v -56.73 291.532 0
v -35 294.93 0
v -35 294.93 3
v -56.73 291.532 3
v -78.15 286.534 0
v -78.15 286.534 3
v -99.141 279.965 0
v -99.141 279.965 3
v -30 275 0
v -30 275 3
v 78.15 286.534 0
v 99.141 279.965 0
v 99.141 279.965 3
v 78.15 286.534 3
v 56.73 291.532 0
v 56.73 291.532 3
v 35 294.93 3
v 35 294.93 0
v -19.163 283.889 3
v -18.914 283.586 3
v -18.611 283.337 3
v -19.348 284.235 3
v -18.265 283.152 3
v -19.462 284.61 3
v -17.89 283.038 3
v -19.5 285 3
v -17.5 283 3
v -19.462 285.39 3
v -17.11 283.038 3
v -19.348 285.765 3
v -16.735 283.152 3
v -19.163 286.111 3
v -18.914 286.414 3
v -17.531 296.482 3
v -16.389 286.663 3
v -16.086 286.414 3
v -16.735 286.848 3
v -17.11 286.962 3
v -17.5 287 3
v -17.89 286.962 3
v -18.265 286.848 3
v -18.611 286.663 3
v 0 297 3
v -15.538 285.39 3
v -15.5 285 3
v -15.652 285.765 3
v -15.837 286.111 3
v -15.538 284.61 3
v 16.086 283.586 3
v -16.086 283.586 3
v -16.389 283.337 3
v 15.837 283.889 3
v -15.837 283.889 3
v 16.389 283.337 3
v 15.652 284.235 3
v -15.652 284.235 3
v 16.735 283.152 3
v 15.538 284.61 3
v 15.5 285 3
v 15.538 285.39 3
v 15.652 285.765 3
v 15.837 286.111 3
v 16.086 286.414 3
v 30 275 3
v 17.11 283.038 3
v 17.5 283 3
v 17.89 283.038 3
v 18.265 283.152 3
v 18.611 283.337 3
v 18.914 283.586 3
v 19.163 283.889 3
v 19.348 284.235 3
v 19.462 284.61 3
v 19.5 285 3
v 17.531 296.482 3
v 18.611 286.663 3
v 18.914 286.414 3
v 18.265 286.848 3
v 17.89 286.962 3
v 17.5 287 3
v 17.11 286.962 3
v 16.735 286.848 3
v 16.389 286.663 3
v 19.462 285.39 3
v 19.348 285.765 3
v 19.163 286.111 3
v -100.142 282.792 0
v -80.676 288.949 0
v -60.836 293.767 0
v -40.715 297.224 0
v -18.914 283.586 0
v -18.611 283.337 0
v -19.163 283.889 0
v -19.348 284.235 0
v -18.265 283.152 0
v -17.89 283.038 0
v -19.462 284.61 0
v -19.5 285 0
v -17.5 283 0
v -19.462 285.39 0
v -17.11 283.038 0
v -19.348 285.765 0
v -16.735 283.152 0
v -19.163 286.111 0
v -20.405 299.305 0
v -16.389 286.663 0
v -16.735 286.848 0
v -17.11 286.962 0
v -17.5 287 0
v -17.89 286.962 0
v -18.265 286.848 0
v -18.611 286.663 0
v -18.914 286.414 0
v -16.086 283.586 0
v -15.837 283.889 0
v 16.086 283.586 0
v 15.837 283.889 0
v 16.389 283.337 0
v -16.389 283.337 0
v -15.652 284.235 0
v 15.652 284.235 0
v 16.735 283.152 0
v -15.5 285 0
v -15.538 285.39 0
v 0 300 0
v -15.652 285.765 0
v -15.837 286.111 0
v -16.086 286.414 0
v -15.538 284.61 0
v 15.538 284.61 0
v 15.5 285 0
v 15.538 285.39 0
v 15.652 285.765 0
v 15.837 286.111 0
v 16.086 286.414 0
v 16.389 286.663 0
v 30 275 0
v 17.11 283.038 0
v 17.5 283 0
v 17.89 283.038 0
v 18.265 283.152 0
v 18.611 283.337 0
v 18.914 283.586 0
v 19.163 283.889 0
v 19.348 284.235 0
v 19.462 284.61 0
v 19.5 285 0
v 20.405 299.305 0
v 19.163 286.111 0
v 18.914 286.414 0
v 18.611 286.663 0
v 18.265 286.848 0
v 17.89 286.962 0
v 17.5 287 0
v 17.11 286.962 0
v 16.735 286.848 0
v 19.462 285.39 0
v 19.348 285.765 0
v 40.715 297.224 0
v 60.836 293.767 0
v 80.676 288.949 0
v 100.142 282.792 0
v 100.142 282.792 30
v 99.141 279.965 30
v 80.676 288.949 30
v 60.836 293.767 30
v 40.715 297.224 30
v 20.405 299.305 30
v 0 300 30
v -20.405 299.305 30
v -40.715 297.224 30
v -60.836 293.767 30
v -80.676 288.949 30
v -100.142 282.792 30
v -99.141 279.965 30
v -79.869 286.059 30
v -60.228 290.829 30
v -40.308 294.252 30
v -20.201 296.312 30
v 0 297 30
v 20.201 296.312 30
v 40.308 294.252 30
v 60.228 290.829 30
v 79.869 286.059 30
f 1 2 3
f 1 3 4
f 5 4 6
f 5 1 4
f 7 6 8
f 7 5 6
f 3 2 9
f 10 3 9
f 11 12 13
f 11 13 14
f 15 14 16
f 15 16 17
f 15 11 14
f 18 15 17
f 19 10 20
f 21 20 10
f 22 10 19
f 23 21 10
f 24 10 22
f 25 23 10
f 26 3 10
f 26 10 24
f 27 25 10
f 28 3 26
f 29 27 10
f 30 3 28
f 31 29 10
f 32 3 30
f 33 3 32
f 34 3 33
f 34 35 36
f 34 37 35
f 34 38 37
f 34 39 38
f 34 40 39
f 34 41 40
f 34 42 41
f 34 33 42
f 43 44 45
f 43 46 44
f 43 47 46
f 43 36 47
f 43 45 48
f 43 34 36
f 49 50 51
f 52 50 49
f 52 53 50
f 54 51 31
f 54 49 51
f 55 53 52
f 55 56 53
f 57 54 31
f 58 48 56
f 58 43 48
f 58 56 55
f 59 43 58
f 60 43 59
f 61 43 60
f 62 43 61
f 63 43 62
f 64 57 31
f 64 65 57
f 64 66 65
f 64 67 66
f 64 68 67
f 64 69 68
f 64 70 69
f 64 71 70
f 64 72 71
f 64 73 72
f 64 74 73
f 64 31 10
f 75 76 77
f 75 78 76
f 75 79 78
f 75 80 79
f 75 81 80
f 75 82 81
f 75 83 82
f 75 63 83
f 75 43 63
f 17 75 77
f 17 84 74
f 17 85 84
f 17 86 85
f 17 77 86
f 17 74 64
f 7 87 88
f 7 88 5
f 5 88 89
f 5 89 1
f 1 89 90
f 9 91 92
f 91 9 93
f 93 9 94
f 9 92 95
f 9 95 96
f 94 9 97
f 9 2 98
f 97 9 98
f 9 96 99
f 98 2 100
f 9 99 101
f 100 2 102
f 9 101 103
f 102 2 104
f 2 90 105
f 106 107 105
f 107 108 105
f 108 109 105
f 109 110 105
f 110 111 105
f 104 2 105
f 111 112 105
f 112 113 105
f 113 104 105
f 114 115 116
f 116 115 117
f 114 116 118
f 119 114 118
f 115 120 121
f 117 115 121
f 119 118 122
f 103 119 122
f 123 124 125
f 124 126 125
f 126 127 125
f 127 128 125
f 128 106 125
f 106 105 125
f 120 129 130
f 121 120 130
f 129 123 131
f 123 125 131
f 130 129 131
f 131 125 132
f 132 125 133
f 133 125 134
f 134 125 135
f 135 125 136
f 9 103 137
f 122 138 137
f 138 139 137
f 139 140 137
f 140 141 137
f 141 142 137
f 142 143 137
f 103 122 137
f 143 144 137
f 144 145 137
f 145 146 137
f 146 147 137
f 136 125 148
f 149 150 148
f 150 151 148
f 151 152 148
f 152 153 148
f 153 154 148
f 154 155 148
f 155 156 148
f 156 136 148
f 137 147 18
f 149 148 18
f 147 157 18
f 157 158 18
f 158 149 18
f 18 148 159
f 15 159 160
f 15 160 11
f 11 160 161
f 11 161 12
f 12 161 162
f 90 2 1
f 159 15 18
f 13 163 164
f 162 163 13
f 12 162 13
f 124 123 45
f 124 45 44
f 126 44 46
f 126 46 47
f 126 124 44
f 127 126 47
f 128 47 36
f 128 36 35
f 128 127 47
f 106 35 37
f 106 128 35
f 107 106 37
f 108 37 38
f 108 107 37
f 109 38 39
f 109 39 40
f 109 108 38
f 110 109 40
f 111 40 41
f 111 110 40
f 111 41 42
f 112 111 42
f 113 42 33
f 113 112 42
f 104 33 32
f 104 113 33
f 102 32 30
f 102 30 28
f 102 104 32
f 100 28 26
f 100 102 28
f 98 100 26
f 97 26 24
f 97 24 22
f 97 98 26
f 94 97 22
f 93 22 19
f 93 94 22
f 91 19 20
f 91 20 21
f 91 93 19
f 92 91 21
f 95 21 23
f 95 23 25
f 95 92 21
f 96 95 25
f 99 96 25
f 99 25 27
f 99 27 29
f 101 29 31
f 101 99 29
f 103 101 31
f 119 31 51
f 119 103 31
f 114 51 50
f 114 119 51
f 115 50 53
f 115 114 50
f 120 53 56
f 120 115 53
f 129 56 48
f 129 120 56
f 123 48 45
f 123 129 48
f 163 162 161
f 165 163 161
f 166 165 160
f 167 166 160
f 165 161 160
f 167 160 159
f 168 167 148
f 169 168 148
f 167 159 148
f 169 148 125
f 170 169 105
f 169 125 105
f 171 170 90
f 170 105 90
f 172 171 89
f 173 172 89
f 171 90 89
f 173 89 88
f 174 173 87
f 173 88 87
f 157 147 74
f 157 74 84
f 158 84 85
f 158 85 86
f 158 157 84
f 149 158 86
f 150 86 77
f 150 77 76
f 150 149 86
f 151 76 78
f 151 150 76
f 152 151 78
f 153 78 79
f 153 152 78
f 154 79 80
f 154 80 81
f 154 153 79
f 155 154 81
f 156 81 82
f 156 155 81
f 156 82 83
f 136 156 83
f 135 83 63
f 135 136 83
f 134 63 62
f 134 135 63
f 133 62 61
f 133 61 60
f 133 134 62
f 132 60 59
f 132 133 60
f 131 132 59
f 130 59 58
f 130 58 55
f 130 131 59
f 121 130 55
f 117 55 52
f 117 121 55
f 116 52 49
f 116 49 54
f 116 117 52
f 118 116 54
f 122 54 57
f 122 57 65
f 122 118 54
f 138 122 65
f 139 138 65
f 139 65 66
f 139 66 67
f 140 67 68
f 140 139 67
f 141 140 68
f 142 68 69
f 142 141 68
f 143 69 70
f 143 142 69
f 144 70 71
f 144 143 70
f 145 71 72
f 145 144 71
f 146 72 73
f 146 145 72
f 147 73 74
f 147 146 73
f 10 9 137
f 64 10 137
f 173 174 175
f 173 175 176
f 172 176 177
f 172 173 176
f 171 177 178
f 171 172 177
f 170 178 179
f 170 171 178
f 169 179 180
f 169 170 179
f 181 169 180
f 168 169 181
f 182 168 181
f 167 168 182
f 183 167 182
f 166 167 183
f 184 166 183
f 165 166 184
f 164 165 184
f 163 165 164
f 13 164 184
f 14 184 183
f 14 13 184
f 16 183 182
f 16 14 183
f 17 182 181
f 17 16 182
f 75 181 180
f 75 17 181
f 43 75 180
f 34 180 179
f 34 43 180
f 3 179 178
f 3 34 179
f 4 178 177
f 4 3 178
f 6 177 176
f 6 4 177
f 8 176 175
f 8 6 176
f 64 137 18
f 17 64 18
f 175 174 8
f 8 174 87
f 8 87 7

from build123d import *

# Parameters (mm, degrees)
SKETCH_R     = 2
PAD_DEPTH    = 3
PAD001_DEPTH = 27


with BuildPart() as part:
    # Sketch → Pad (new body)
    with BuildSketch(Plane.XY):
        with BuildLine():
            ThreePointArc((100.142058, 282.792447), (0, 300), (-100.142058, 282.792447))
            Line((-100.142058, 282.792447), (-99.140637, 279.964523))
            ThreePointArc((-35, 294.9305), (-67.486464, 289.23101), (-99.140637, 279.964523))
            Line((-35, 294.9305), (-30, 275))
            Line((-30, 275), (30, 275))
            Line((30, 275), (35, 294.9305))
            ThreePointArc((99.140637, 279.964523), (67.486464, 289.23101), (35, 294.9305))
            Line((100.142058, 282.792447), (99.140637, 279.964523))
        make_face()
        with Locations((-17.5, 285)):
            Circle(SKETCH_R, mode=Mode.SUBTRACT)
        with Locations((17.5, 285)):
            Circle(SKETCH_R, mode=Mode.SUBTRACT)
    extrude(amount=PAD_DEPTH)

    # Sketch001 (on Face12 of Pad) → Pad001 (join)
    with BuildSketch(Plane.XY.offset(3)):
        with BuildLine():
            ThreePointArc((100.142058, 282.792447), (0, 300), (-100.142058, 282.792447))
            Line((-100.142058, 282.792447), (-99.140637, 279.964523))
            ThreePointArc((99.140637, 279.964523), (0, 297), (-99.140637, 279.964523))
            Line((100.142058, 282.792447), (99.140637, 279.964523))
        make_face()
    extrude(amount=PAD001_DEPTH)


solid = part.part
